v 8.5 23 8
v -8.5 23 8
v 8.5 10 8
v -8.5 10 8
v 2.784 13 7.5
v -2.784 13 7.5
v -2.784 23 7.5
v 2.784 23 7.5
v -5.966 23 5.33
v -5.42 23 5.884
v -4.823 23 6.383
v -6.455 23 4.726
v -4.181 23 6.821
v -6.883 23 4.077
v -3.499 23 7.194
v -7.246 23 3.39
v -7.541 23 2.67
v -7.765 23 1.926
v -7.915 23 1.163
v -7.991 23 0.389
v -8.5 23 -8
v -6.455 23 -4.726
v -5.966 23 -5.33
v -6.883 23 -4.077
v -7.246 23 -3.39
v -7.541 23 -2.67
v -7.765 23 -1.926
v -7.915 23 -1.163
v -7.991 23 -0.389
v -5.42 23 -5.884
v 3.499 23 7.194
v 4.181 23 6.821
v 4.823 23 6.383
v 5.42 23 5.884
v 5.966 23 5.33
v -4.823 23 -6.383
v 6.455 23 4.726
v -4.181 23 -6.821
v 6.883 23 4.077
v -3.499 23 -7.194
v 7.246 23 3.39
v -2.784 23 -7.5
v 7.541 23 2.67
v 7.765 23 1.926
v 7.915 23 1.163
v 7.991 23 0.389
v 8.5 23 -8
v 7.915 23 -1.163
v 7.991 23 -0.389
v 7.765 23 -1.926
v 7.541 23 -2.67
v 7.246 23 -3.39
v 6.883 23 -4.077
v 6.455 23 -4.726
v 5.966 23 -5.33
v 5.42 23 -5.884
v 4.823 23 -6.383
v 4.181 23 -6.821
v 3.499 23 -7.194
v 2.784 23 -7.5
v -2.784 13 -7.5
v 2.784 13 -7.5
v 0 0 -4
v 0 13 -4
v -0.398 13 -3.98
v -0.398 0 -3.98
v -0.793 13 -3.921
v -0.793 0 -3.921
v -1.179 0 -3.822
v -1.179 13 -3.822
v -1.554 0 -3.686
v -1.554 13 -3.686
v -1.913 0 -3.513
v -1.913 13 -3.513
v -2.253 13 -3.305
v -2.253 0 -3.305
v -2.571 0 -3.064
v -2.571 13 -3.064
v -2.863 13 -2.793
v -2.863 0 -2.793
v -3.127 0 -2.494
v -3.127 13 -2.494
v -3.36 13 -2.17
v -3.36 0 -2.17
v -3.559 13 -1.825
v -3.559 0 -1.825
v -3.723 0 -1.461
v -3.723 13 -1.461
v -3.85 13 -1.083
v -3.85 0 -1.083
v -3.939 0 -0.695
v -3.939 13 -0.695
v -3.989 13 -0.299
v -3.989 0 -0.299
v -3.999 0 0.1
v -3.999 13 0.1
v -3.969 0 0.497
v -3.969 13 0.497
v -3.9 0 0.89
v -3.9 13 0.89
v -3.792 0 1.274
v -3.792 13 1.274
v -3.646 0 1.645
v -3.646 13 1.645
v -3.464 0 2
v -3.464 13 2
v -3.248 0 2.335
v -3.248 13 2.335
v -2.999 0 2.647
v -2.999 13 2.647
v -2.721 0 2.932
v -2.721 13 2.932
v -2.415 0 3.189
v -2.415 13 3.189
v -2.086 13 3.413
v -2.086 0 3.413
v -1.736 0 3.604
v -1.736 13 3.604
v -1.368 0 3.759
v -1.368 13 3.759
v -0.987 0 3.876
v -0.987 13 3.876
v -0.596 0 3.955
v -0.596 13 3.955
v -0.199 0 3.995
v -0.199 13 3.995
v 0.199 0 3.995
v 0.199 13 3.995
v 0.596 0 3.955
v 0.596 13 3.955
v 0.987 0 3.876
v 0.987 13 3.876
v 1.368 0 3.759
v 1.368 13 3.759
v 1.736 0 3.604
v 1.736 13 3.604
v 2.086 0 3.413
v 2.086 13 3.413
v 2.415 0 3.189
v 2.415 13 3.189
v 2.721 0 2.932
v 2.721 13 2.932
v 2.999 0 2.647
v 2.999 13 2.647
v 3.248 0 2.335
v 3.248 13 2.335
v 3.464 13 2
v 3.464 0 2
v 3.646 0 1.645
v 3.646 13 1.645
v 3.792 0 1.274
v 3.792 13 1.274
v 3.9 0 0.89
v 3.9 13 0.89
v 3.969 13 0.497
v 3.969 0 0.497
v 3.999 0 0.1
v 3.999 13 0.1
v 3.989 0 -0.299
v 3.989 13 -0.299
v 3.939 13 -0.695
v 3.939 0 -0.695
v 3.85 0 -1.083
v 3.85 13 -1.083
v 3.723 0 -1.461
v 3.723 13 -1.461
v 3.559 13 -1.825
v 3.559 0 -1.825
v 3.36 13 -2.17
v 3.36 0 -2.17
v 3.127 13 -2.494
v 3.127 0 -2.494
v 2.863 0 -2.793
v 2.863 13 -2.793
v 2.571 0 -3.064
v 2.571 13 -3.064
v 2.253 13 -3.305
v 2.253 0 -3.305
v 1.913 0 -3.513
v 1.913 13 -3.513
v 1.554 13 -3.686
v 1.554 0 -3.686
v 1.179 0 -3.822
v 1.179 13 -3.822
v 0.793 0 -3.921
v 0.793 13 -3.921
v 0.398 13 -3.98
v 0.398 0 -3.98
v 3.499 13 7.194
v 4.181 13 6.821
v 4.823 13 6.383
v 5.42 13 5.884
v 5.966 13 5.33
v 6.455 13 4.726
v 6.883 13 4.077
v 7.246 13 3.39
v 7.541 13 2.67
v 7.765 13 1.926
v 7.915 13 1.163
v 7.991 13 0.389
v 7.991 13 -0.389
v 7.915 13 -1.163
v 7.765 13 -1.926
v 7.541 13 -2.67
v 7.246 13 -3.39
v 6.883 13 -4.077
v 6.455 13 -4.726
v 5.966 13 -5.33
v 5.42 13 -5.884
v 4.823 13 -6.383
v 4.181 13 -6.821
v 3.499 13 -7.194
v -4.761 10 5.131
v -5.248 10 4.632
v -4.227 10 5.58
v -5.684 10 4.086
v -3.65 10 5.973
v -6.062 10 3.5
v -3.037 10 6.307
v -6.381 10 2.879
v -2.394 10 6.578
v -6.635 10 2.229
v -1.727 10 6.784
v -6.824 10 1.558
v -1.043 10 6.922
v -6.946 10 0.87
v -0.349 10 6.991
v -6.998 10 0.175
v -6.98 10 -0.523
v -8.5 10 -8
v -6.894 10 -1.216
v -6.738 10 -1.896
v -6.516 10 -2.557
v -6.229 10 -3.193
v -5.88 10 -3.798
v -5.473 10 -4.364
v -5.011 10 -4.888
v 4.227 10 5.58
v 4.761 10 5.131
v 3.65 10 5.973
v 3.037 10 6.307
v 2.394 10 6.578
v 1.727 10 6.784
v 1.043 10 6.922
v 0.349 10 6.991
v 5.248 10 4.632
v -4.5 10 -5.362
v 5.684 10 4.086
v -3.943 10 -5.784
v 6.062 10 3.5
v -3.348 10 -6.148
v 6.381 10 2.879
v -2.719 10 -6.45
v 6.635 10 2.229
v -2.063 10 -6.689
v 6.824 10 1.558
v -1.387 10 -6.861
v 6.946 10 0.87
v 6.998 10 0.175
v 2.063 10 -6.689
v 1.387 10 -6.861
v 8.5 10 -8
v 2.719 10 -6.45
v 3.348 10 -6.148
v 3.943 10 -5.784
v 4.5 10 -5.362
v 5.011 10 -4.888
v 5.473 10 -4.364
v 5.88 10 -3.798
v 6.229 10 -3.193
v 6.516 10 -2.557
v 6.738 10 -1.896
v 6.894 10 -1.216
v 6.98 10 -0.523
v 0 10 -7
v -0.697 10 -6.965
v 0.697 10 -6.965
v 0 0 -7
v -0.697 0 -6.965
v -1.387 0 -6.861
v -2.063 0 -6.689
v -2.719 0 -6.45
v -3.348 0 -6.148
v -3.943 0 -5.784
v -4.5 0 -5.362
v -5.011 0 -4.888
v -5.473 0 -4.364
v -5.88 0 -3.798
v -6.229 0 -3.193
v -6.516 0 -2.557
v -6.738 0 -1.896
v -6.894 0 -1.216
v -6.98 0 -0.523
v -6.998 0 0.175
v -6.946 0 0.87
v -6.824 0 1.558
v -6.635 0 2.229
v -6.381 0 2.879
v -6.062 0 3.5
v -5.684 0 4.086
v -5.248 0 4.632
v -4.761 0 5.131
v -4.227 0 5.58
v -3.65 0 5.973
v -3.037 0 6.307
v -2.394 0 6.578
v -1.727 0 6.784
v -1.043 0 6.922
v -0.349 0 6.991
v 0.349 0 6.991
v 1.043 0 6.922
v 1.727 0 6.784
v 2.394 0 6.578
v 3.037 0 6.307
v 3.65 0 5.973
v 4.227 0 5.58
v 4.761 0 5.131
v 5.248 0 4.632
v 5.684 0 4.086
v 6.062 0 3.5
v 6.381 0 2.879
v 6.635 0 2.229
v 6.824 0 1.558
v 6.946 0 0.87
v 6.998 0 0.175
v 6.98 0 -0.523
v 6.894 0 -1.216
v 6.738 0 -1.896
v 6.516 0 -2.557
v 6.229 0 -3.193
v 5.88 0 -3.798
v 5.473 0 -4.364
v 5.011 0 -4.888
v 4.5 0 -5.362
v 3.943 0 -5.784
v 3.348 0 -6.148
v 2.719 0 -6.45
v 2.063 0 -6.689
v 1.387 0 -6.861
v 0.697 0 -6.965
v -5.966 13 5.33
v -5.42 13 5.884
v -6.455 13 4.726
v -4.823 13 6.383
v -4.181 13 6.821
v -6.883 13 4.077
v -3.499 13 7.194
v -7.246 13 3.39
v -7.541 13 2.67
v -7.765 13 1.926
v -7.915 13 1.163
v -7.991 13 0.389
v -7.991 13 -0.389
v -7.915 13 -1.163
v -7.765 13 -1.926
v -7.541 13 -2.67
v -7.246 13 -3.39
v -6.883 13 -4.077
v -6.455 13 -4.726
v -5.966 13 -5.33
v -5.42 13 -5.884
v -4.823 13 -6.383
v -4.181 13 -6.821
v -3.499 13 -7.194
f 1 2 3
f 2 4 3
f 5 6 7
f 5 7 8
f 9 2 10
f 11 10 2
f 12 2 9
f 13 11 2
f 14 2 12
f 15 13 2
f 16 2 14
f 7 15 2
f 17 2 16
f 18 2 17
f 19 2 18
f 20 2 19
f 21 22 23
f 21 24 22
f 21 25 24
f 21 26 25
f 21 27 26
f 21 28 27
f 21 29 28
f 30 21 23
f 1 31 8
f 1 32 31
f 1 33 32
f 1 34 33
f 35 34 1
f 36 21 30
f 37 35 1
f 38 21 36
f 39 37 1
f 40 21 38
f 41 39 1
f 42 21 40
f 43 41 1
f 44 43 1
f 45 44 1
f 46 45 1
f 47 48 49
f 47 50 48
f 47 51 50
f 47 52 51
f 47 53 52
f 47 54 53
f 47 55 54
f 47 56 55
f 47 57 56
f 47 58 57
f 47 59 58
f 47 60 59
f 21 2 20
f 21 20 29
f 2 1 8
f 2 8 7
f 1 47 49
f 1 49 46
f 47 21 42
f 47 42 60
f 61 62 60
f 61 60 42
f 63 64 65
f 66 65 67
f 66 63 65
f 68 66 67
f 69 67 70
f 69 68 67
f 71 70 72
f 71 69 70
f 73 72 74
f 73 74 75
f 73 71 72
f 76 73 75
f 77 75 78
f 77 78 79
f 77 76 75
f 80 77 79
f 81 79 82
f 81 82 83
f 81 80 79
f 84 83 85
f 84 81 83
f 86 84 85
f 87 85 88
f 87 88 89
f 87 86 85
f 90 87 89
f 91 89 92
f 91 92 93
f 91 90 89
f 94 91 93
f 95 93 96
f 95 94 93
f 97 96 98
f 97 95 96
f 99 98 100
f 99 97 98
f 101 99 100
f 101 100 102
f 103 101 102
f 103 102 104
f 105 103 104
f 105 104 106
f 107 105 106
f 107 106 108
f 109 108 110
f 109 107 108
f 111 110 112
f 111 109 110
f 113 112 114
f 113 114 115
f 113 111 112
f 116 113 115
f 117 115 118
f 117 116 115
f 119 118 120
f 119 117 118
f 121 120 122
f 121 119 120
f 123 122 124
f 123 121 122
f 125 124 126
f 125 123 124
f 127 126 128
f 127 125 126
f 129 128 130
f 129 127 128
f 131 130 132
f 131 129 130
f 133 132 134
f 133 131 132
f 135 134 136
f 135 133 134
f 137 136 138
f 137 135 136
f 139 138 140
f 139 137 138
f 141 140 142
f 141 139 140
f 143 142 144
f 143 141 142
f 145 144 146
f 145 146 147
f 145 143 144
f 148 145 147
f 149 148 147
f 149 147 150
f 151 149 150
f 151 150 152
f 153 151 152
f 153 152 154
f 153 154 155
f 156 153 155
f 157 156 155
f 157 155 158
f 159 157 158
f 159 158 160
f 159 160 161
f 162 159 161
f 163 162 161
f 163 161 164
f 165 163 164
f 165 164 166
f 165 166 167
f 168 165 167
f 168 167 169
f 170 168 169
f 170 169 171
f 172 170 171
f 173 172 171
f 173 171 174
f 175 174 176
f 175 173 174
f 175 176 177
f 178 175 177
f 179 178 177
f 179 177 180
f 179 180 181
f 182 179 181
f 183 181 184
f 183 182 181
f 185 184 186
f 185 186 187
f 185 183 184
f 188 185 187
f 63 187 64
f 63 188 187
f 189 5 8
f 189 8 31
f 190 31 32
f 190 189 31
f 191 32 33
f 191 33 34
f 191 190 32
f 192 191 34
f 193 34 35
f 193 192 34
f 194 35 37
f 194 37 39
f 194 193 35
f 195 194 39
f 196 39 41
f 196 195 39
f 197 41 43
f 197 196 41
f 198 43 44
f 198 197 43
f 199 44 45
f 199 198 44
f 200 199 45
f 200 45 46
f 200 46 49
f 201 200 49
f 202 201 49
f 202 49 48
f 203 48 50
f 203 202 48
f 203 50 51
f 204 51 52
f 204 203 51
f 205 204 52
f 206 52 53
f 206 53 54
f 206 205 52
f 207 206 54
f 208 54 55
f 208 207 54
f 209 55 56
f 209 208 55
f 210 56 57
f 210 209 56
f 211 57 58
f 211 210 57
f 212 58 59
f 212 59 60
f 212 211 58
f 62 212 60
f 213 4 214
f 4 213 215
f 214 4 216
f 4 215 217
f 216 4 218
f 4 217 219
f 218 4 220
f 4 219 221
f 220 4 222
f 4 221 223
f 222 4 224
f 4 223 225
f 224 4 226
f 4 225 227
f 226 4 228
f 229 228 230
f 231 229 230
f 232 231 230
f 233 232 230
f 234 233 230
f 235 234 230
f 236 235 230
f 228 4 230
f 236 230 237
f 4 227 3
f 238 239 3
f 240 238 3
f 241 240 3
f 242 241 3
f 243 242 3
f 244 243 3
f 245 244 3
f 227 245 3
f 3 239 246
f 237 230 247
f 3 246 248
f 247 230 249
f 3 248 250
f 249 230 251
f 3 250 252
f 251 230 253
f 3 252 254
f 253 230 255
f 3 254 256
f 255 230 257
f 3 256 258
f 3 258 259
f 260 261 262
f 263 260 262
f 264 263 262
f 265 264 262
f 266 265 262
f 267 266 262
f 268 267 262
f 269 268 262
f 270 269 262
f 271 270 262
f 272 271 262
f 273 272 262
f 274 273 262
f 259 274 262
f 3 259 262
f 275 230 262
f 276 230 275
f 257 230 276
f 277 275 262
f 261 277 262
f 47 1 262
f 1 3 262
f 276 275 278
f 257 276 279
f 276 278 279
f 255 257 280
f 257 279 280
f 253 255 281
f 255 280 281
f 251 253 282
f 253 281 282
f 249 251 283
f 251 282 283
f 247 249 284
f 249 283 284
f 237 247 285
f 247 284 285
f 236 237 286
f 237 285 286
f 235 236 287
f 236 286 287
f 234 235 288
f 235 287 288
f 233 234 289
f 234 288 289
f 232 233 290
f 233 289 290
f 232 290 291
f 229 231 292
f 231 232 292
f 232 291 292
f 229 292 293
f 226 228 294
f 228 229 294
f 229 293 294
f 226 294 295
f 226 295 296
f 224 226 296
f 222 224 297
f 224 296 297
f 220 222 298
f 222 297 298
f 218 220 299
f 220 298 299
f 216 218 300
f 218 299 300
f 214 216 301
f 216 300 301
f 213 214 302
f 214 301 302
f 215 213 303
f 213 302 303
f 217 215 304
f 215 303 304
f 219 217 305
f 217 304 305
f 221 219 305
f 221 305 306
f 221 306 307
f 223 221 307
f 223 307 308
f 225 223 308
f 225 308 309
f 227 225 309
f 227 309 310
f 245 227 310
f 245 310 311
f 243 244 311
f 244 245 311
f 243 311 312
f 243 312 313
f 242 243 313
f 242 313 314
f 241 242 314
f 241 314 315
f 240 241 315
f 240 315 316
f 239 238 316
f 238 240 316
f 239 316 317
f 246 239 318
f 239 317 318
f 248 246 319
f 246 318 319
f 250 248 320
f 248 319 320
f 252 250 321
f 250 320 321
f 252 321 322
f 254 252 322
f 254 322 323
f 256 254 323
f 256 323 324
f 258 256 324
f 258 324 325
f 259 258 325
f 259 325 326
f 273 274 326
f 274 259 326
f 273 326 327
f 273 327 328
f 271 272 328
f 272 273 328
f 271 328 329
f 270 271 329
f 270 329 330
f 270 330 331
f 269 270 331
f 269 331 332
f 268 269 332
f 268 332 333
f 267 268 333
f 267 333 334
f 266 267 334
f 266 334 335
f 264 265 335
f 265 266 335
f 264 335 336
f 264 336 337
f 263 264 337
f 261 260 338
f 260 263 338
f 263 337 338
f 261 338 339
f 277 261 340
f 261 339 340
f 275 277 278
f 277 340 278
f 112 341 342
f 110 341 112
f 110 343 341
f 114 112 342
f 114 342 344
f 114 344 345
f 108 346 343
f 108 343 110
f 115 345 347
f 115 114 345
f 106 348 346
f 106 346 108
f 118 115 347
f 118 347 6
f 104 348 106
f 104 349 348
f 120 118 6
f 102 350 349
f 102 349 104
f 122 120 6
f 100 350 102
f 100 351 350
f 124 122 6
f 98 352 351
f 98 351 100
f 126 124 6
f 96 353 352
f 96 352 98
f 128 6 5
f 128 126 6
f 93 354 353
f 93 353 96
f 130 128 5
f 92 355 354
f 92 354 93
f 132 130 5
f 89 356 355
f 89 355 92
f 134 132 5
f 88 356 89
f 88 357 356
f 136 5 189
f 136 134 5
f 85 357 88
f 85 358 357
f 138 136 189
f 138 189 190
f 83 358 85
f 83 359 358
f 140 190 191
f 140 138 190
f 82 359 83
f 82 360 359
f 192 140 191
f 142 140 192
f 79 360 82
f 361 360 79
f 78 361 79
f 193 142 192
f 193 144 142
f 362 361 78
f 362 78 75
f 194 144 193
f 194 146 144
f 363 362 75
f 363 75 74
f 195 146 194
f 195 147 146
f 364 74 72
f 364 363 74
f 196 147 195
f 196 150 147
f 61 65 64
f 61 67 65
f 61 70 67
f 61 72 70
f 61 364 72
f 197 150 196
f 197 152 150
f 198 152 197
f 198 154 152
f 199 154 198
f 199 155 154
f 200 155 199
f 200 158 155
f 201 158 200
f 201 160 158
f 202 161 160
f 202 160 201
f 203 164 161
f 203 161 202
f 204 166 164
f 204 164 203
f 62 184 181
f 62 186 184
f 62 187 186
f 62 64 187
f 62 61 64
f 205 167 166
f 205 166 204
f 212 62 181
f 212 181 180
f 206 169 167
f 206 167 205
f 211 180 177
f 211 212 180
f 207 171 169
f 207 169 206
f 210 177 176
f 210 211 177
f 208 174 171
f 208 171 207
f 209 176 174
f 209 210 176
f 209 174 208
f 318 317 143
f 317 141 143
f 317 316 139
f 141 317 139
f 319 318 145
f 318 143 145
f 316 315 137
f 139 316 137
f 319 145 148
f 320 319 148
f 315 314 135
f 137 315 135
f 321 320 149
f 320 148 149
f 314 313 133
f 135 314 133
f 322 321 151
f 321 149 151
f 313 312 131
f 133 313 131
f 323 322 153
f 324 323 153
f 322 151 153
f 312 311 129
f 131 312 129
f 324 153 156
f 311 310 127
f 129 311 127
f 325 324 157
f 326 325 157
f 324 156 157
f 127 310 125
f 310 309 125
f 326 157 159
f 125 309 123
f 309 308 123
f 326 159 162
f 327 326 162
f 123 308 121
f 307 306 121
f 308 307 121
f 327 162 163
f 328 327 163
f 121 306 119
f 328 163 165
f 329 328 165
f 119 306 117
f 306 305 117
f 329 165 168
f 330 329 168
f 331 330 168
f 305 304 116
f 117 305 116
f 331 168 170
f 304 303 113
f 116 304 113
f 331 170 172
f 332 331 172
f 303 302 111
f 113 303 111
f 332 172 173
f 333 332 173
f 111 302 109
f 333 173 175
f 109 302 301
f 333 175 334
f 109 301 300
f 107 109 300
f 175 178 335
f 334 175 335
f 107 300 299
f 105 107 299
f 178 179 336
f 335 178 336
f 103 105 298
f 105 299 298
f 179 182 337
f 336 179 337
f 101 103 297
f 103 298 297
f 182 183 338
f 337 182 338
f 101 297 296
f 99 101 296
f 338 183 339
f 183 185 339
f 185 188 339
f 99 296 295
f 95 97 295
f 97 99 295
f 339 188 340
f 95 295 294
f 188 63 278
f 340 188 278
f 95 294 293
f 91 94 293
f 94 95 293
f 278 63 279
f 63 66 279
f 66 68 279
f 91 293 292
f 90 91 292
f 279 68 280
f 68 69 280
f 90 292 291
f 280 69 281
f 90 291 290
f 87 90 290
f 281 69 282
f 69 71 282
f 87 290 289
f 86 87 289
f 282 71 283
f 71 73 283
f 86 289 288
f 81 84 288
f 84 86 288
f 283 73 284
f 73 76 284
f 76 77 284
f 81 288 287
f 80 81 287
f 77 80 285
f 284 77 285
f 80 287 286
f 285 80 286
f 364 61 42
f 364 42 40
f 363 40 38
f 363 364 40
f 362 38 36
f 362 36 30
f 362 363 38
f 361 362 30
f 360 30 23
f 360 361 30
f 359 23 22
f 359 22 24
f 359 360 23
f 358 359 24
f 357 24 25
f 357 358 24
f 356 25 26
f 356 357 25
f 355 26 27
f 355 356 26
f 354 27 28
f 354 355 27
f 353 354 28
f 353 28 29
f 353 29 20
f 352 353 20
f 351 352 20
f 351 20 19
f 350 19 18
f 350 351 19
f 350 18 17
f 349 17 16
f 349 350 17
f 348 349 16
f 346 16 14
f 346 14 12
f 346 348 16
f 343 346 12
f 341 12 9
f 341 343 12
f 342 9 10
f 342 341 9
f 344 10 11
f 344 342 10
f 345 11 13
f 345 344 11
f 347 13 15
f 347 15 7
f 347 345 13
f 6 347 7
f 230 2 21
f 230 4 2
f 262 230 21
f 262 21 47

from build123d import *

# Parameters (mm, degrees)
SKETCH1_R           = 7
SKETCH1_R_2         = 4
BOSS_EXTRUDE1_DEPTH = 13
SKETCH5_W           = 17
SKETCH5_H           = 16
BOSS_EXTRUDE3_DEPTH = 3
CUT_EXTRUDE2_START  = -14
SKETCH7_R           = 4
CUT_EXTRUDE2_DEPTH  = 14
SKETCH6_W           = 17
SKETCH6_H           = 16
BOSS_EXTRUDE5_DEPTH = 10


with BuildPart() as part:
    # Sketch1 → Boss-Extrude1 (new body)
    with BuildSketch(Plane(origin=(0, 0, 0), x_dir=(1, 0, 0), z_dir=(0, 1, 0))):
        with Locations(Location((0, 0, 0), (0, 0, 90))):
            Circle(SKETCH1_R)
        with Locations(Location((0, 0, 0), (0, 0, 90))):
            Circle(SKETCH1_R_2, mode=Mode.SUBTRACT)
    extrude(amount=BOSS_EXTRUDE1_DEPTH)

    # Sketch5 → Boss-Extrude3 (add)
    with BuildSketch(Plane(origin=(0, 10, 0), x_dir=(1, 0, 0), z_dir=(0, 1, 0))):
        Rectangle(SKETCH5_W, SKETCH5_H)
    extrude(amount=BOSS_EXTRUDE3_DEPTH)

    # Sketch7 → Cut-Extrude2 (cut)
    with BuildSketch(Plane(origin=(0, 13, 0), x_dir=(1, 0, 0), z_dir=(0, 1, 0)).offset(CUT_EXTRUDE2_START)):
        with Locations(Location((0, 0, 0), (0, 0, 90))):
            Circle(SKETCH7_R)
    extrude(amount=CUT_EXTRUDE2_DEPTH, mode=Mode.SUBTRACT)

    # Sketch6 → Boss-Extrude5 (add)
    with BuildSketch(Plane(origin=(0, 13, 0), x_dir=(1, 0, 0), z_dir=(0, 1, 0))):
        Rectangle(SKETCH6_W, SKETCH6_H)
        with BuildLine():
            ThreePointArc((2.783882181, -7.5), (8, 0), (2.783882181, 7.5))
            Line((2.783882181, 7.5), (-2.783882181, 7.5))
            ThreePointArc((-2.783882181, 7.5), (-8, 0), (-2.783882181, -7.5))
            Line((-2.783882181, -7.5), (2.783882181, -7.5))
        make_face(mode=Mode.SUBTRACT)
    extrude(amount=BOSS_EXTRUDE5_DEPTH)


solid = part.part
